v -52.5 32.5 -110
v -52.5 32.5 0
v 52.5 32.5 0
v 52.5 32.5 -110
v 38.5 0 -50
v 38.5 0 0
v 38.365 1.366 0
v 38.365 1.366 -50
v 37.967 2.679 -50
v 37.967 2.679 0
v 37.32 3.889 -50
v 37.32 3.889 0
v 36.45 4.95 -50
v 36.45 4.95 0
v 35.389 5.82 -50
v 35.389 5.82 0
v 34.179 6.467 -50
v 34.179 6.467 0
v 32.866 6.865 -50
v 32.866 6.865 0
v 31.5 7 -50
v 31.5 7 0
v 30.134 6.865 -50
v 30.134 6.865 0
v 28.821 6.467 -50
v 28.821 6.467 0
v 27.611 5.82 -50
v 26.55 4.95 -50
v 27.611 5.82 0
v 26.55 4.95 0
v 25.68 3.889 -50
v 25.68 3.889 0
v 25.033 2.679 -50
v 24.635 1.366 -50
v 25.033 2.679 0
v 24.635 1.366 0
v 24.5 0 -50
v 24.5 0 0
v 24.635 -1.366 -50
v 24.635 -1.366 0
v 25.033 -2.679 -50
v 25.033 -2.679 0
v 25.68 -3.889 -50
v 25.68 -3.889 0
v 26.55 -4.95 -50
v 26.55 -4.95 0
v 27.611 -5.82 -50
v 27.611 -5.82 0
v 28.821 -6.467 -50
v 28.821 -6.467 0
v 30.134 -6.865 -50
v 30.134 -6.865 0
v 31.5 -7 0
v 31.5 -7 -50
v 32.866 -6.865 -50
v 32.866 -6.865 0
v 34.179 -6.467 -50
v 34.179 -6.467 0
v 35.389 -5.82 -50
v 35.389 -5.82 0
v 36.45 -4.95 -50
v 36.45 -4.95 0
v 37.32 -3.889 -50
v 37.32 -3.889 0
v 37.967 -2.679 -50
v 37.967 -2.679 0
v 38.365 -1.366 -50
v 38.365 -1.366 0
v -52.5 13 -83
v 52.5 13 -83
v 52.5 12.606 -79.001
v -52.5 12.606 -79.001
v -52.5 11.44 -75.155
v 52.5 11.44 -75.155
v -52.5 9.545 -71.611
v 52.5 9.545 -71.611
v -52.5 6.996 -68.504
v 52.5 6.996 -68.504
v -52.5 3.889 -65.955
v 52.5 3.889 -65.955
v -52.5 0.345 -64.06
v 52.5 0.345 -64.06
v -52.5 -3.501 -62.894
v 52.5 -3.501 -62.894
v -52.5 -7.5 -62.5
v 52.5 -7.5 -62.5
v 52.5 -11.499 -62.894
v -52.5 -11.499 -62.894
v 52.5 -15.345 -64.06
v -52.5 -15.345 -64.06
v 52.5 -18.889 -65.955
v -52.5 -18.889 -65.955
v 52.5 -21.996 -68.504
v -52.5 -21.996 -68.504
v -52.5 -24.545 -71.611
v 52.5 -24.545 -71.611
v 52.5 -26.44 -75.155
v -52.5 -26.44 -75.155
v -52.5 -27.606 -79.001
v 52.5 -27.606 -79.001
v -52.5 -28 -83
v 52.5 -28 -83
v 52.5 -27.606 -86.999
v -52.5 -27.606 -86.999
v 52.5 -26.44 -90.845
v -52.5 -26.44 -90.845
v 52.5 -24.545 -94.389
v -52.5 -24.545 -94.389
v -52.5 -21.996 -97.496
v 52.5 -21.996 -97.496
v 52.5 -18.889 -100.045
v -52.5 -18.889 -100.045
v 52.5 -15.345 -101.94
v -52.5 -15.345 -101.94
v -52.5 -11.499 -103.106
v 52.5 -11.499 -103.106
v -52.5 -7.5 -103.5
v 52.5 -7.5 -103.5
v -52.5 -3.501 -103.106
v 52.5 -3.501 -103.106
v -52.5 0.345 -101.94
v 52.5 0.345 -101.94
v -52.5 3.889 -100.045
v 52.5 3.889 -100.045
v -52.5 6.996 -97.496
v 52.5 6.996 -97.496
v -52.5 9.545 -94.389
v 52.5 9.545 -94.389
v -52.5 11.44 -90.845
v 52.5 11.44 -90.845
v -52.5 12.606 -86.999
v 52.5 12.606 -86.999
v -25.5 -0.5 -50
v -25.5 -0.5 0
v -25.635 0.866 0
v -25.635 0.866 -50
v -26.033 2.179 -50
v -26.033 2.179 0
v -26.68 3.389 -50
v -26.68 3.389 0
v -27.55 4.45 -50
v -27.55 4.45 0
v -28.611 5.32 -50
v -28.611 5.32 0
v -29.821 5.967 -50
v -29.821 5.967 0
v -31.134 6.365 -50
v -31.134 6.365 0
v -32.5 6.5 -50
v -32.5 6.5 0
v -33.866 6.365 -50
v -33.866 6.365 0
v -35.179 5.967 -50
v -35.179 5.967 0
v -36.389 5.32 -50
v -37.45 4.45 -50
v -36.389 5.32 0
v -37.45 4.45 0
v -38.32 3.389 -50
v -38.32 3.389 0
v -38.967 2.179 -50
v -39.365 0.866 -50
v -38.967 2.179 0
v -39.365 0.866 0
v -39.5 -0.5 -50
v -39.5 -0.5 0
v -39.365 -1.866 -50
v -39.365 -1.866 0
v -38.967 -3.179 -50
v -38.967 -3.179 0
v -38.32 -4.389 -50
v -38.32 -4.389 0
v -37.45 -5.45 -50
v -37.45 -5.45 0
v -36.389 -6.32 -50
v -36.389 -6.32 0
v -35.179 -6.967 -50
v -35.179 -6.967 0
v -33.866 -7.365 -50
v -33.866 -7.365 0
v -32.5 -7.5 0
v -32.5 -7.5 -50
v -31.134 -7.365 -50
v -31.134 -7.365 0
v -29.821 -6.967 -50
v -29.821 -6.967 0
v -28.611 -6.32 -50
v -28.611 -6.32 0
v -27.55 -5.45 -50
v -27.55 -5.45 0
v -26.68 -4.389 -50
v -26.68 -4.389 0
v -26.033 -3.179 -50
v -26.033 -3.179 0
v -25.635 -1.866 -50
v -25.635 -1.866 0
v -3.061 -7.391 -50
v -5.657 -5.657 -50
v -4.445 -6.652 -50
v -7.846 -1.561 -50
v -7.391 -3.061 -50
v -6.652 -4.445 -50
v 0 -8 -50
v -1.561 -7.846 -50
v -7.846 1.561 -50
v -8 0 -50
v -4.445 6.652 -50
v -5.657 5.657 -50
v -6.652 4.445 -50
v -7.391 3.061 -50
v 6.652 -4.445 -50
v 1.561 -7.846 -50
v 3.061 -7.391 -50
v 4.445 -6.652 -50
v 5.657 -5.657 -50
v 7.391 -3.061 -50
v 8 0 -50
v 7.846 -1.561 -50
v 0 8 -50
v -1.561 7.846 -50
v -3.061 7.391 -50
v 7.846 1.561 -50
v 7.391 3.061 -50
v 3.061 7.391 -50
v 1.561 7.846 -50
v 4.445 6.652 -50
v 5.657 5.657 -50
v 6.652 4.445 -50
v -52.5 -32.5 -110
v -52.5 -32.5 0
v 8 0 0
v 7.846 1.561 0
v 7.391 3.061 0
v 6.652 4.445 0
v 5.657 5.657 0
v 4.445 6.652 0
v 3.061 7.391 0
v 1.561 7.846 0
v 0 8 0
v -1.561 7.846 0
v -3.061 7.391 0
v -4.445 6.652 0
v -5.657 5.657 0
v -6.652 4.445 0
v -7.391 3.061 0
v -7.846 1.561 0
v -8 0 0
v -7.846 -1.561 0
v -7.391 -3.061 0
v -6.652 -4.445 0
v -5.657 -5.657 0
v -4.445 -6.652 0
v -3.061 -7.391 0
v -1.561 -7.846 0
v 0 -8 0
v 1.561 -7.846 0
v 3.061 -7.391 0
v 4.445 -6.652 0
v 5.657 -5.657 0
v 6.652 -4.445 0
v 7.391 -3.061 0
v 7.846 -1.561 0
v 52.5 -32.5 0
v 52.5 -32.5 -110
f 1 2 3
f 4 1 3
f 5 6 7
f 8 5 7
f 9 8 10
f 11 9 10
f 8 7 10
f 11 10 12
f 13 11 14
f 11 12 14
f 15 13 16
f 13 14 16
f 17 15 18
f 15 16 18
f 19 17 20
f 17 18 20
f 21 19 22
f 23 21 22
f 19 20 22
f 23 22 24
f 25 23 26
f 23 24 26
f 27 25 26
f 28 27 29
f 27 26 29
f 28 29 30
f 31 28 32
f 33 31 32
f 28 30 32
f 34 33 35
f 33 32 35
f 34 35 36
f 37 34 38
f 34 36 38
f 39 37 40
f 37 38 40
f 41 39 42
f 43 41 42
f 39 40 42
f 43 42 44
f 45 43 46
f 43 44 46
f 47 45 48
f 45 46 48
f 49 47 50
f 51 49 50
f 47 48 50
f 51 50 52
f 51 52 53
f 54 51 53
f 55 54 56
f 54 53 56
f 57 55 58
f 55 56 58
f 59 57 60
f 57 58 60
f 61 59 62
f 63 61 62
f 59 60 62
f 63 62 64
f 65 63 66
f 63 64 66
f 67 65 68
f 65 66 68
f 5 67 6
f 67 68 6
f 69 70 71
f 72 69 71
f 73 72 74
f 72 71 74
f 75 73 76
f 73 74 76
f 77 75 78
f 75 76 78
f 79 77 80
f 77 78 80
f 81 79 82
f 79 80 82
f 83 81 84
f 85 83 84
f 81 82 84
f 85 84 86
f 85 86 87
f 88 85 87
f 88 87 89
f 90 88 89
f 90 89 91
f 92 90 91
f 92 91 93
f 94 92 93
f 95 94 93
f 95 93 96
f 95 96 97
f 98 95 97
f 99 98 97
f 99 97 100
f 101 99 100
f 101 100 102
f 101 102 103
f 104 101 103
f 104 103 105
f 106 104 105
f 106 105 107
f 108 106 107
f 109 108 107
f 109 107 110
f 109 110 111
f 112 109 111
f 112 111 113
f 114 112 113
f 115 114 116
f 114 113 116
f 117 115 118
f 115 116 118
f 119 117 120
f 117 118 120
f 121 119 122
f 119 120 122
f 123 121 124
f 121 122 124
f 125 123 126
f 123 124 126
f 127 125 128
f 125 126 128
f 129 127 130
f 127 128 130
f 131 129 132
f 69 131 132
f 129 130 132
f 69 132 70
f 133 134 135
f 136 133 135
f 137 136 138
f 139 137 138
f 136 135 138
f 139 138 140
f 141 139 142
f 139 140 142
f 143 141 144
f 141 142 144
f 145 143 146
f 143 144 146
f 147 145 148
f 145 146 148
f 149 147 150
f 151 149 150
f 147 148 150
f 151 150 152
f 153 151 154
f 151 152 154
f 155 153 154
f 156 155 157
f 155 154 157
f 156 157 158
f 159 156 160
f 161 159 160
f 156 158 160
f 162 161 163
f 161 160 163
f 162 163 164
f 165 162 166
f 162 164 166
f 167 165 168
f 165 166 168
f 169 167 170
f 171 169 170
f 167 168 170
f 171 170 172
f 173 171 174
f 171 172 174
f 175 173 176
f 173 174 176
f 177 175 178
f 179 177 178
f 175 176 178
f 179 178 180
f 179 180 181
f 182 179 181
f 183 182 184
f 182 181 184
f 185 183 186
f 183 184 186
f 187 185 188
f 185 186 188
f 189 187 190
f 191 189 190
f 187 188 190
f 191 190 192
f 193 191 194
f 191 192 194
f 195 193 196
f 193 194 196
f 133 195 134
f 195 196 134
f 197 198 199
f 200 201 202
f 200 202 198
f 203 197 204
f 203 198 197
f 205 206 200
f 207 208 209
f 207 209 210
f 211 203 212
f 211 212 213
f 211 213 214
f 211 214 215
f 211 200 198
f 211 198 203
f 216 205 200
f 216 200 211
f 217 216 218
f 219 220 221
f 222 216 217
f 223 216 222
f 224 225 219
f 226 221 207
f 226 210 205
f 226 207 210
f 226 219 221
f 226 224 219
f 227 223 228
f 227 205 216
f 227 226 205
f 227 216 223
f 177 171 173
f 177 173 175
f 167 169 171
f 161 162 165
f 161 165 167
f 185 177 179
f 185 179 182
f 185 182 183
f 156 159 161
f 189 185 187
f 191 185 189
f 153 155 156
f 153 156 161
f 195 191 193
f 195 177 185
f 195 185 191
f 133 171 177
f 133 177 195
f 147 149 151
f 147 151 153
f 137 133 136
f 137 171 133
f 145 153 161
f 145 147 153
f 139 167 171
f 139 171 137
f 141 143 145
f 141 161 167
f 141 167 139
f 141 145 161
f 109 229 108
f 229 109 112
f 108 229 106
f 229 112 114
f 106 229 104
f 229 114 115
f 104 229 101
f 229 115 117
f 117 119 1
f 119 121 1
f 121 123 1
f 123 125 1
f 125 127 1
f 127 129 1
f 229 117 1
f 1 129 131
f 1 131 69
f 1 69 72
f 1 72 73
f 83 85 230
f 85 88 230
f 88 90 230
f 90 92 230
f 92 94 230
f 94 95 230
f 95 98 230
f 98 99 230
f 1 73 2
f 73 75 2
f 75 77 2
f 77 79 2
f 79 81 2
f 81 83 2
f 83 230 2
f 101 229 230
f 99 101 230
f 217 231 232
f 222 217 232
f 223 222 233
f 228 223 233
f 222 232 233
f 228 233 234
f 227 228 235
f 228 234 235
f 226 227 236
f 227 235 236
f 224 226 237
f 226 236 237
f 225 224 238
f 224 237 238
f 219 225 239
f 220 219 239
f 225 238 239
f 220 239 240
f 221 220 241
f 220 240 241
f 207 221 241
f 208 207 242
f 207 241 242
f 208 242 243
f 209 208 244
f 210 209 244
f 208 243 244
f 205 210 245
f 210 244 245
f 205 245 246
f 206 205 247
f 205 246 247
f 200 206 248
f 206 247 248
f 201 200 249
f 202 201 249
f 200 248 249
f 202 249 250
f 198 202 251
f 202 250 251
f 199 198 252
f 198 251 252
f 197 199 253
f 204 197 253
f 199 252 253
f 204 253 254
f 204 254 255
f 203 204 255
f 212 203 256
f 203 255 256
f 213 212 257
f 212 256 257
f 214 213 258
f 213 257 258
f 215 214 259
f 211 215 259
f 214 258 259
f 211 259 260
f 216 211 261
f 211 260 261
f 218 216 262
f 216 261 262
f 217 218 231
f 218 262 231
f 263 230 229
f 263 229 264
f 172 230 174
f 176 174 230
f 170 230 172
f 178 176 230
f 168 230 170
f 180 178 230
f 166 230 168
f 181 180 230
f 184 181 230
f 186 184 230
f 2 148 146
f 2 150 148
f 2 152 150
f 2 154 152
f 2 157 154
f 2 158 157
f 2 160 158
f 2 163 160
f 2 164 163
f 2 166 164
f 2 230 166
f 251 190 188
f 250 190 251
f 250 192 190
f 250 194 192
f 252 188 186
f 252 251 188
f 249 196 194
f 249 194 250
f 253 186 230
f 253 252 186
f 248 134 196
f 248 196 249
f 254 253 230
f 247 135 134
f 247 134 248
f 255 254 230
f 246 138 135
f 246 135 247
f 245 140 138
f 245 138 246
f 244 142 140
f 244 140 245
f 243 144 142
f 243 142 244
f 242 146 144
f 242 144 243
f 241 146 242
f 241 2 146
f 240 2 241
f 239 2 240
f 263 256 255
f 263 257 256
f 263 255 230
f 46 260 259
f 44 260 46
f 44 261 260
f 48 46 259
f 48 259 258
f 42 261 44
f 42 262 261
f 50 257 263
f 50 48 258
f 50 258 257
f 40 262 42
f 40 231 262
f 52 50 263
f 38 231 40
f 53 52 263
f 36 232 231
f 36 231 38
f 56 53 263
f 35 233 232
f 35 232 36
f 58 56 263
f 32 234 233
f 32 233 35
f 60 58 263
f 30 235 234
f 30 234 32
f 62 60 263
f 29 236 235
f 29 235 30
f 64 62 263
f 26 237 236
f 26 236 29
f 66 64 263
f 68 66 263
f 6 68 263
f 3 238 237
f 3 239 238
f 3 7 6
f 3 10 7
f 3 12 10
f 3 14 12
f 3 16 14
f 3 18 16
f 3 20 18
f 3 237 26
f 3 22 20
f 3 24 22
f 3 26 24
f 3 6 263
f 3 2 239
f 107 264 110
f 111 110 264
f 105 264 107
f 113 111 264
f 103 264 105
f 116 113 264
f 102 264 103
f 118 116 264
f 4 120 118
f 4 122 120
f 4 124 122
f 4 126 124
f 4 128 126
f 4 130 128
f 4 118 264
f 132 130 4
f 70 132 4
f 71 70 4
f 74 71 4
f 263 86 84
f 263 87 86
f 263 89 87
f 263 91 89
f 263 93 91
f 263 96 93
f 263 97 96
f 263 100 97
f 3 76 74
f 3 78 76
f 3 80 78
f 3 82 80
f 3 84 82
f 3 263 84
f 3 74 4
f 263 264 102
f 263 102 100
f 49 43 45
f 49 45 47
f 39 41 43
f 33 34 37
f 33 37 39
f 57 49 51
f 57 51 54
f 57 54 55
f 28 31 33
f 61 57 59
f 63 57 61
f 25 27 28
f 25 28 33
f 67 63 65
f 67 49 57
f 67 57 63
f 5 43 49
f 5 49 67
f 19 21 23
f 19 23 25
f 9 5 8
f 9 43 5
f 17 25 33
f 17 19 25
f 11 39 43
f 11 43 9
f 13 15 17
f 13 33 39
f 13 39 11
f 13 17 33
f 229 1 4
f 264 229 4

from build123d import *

# Parameters (mm, degrees)
SKETCH_2_W          = 105
SKETCH_2_H          = 65
EXTRUDE_1_DEPTH     = 110
SKETCH_3_R          = 7
SKETCH_3_R_2        = 8
CUT_EXTRUDE_1_DEPTH = 50
SKETCH_4_R          = 20.5
CUT_EXTRUDE_2_DEPTH = 156.503215401


with BuildPart() as part:
    # 草图2 → 凸台-拉伸1 (new body)
    with BuildSketch(Plane.XY):
        Rectangle(SKETCH_2_W, SKETCH_2_H)
    extrude(amount=-EXTRUDE_1_DEPTH)

    # 草图3 → 切除-拉伸1 (cut)
    with BuildSketch(Plane.XY):
        with Locations((-32.5, -0.5)):
            Circle(SKETCH_3_R)
        with Locations((31.5, 0)):
            Circle(SKETCH_3_R)
        Circle(SKETCH_3_R_2)
    extrude(amount=-CUT_EXTRUDE_1_DEPTH, mode=Mode.SUBTRACT)

    # 草图4 → 切除-拉伸2 (cut, through all)
    with BuildSketch(Plane(origin=(52.5, 0, 0), x_dir=(0, 0, -1), z_dir=(1, 0, 0))):
        with Locations(Location((83, -7.5, 0), (0, 0, 90))):
            Circle(SKETCH_4_R)
    extrude(amount=-CUT_EXTRUDE_2_DEPTH, mode=Mode.SUBTRACT)


solid = part.part
